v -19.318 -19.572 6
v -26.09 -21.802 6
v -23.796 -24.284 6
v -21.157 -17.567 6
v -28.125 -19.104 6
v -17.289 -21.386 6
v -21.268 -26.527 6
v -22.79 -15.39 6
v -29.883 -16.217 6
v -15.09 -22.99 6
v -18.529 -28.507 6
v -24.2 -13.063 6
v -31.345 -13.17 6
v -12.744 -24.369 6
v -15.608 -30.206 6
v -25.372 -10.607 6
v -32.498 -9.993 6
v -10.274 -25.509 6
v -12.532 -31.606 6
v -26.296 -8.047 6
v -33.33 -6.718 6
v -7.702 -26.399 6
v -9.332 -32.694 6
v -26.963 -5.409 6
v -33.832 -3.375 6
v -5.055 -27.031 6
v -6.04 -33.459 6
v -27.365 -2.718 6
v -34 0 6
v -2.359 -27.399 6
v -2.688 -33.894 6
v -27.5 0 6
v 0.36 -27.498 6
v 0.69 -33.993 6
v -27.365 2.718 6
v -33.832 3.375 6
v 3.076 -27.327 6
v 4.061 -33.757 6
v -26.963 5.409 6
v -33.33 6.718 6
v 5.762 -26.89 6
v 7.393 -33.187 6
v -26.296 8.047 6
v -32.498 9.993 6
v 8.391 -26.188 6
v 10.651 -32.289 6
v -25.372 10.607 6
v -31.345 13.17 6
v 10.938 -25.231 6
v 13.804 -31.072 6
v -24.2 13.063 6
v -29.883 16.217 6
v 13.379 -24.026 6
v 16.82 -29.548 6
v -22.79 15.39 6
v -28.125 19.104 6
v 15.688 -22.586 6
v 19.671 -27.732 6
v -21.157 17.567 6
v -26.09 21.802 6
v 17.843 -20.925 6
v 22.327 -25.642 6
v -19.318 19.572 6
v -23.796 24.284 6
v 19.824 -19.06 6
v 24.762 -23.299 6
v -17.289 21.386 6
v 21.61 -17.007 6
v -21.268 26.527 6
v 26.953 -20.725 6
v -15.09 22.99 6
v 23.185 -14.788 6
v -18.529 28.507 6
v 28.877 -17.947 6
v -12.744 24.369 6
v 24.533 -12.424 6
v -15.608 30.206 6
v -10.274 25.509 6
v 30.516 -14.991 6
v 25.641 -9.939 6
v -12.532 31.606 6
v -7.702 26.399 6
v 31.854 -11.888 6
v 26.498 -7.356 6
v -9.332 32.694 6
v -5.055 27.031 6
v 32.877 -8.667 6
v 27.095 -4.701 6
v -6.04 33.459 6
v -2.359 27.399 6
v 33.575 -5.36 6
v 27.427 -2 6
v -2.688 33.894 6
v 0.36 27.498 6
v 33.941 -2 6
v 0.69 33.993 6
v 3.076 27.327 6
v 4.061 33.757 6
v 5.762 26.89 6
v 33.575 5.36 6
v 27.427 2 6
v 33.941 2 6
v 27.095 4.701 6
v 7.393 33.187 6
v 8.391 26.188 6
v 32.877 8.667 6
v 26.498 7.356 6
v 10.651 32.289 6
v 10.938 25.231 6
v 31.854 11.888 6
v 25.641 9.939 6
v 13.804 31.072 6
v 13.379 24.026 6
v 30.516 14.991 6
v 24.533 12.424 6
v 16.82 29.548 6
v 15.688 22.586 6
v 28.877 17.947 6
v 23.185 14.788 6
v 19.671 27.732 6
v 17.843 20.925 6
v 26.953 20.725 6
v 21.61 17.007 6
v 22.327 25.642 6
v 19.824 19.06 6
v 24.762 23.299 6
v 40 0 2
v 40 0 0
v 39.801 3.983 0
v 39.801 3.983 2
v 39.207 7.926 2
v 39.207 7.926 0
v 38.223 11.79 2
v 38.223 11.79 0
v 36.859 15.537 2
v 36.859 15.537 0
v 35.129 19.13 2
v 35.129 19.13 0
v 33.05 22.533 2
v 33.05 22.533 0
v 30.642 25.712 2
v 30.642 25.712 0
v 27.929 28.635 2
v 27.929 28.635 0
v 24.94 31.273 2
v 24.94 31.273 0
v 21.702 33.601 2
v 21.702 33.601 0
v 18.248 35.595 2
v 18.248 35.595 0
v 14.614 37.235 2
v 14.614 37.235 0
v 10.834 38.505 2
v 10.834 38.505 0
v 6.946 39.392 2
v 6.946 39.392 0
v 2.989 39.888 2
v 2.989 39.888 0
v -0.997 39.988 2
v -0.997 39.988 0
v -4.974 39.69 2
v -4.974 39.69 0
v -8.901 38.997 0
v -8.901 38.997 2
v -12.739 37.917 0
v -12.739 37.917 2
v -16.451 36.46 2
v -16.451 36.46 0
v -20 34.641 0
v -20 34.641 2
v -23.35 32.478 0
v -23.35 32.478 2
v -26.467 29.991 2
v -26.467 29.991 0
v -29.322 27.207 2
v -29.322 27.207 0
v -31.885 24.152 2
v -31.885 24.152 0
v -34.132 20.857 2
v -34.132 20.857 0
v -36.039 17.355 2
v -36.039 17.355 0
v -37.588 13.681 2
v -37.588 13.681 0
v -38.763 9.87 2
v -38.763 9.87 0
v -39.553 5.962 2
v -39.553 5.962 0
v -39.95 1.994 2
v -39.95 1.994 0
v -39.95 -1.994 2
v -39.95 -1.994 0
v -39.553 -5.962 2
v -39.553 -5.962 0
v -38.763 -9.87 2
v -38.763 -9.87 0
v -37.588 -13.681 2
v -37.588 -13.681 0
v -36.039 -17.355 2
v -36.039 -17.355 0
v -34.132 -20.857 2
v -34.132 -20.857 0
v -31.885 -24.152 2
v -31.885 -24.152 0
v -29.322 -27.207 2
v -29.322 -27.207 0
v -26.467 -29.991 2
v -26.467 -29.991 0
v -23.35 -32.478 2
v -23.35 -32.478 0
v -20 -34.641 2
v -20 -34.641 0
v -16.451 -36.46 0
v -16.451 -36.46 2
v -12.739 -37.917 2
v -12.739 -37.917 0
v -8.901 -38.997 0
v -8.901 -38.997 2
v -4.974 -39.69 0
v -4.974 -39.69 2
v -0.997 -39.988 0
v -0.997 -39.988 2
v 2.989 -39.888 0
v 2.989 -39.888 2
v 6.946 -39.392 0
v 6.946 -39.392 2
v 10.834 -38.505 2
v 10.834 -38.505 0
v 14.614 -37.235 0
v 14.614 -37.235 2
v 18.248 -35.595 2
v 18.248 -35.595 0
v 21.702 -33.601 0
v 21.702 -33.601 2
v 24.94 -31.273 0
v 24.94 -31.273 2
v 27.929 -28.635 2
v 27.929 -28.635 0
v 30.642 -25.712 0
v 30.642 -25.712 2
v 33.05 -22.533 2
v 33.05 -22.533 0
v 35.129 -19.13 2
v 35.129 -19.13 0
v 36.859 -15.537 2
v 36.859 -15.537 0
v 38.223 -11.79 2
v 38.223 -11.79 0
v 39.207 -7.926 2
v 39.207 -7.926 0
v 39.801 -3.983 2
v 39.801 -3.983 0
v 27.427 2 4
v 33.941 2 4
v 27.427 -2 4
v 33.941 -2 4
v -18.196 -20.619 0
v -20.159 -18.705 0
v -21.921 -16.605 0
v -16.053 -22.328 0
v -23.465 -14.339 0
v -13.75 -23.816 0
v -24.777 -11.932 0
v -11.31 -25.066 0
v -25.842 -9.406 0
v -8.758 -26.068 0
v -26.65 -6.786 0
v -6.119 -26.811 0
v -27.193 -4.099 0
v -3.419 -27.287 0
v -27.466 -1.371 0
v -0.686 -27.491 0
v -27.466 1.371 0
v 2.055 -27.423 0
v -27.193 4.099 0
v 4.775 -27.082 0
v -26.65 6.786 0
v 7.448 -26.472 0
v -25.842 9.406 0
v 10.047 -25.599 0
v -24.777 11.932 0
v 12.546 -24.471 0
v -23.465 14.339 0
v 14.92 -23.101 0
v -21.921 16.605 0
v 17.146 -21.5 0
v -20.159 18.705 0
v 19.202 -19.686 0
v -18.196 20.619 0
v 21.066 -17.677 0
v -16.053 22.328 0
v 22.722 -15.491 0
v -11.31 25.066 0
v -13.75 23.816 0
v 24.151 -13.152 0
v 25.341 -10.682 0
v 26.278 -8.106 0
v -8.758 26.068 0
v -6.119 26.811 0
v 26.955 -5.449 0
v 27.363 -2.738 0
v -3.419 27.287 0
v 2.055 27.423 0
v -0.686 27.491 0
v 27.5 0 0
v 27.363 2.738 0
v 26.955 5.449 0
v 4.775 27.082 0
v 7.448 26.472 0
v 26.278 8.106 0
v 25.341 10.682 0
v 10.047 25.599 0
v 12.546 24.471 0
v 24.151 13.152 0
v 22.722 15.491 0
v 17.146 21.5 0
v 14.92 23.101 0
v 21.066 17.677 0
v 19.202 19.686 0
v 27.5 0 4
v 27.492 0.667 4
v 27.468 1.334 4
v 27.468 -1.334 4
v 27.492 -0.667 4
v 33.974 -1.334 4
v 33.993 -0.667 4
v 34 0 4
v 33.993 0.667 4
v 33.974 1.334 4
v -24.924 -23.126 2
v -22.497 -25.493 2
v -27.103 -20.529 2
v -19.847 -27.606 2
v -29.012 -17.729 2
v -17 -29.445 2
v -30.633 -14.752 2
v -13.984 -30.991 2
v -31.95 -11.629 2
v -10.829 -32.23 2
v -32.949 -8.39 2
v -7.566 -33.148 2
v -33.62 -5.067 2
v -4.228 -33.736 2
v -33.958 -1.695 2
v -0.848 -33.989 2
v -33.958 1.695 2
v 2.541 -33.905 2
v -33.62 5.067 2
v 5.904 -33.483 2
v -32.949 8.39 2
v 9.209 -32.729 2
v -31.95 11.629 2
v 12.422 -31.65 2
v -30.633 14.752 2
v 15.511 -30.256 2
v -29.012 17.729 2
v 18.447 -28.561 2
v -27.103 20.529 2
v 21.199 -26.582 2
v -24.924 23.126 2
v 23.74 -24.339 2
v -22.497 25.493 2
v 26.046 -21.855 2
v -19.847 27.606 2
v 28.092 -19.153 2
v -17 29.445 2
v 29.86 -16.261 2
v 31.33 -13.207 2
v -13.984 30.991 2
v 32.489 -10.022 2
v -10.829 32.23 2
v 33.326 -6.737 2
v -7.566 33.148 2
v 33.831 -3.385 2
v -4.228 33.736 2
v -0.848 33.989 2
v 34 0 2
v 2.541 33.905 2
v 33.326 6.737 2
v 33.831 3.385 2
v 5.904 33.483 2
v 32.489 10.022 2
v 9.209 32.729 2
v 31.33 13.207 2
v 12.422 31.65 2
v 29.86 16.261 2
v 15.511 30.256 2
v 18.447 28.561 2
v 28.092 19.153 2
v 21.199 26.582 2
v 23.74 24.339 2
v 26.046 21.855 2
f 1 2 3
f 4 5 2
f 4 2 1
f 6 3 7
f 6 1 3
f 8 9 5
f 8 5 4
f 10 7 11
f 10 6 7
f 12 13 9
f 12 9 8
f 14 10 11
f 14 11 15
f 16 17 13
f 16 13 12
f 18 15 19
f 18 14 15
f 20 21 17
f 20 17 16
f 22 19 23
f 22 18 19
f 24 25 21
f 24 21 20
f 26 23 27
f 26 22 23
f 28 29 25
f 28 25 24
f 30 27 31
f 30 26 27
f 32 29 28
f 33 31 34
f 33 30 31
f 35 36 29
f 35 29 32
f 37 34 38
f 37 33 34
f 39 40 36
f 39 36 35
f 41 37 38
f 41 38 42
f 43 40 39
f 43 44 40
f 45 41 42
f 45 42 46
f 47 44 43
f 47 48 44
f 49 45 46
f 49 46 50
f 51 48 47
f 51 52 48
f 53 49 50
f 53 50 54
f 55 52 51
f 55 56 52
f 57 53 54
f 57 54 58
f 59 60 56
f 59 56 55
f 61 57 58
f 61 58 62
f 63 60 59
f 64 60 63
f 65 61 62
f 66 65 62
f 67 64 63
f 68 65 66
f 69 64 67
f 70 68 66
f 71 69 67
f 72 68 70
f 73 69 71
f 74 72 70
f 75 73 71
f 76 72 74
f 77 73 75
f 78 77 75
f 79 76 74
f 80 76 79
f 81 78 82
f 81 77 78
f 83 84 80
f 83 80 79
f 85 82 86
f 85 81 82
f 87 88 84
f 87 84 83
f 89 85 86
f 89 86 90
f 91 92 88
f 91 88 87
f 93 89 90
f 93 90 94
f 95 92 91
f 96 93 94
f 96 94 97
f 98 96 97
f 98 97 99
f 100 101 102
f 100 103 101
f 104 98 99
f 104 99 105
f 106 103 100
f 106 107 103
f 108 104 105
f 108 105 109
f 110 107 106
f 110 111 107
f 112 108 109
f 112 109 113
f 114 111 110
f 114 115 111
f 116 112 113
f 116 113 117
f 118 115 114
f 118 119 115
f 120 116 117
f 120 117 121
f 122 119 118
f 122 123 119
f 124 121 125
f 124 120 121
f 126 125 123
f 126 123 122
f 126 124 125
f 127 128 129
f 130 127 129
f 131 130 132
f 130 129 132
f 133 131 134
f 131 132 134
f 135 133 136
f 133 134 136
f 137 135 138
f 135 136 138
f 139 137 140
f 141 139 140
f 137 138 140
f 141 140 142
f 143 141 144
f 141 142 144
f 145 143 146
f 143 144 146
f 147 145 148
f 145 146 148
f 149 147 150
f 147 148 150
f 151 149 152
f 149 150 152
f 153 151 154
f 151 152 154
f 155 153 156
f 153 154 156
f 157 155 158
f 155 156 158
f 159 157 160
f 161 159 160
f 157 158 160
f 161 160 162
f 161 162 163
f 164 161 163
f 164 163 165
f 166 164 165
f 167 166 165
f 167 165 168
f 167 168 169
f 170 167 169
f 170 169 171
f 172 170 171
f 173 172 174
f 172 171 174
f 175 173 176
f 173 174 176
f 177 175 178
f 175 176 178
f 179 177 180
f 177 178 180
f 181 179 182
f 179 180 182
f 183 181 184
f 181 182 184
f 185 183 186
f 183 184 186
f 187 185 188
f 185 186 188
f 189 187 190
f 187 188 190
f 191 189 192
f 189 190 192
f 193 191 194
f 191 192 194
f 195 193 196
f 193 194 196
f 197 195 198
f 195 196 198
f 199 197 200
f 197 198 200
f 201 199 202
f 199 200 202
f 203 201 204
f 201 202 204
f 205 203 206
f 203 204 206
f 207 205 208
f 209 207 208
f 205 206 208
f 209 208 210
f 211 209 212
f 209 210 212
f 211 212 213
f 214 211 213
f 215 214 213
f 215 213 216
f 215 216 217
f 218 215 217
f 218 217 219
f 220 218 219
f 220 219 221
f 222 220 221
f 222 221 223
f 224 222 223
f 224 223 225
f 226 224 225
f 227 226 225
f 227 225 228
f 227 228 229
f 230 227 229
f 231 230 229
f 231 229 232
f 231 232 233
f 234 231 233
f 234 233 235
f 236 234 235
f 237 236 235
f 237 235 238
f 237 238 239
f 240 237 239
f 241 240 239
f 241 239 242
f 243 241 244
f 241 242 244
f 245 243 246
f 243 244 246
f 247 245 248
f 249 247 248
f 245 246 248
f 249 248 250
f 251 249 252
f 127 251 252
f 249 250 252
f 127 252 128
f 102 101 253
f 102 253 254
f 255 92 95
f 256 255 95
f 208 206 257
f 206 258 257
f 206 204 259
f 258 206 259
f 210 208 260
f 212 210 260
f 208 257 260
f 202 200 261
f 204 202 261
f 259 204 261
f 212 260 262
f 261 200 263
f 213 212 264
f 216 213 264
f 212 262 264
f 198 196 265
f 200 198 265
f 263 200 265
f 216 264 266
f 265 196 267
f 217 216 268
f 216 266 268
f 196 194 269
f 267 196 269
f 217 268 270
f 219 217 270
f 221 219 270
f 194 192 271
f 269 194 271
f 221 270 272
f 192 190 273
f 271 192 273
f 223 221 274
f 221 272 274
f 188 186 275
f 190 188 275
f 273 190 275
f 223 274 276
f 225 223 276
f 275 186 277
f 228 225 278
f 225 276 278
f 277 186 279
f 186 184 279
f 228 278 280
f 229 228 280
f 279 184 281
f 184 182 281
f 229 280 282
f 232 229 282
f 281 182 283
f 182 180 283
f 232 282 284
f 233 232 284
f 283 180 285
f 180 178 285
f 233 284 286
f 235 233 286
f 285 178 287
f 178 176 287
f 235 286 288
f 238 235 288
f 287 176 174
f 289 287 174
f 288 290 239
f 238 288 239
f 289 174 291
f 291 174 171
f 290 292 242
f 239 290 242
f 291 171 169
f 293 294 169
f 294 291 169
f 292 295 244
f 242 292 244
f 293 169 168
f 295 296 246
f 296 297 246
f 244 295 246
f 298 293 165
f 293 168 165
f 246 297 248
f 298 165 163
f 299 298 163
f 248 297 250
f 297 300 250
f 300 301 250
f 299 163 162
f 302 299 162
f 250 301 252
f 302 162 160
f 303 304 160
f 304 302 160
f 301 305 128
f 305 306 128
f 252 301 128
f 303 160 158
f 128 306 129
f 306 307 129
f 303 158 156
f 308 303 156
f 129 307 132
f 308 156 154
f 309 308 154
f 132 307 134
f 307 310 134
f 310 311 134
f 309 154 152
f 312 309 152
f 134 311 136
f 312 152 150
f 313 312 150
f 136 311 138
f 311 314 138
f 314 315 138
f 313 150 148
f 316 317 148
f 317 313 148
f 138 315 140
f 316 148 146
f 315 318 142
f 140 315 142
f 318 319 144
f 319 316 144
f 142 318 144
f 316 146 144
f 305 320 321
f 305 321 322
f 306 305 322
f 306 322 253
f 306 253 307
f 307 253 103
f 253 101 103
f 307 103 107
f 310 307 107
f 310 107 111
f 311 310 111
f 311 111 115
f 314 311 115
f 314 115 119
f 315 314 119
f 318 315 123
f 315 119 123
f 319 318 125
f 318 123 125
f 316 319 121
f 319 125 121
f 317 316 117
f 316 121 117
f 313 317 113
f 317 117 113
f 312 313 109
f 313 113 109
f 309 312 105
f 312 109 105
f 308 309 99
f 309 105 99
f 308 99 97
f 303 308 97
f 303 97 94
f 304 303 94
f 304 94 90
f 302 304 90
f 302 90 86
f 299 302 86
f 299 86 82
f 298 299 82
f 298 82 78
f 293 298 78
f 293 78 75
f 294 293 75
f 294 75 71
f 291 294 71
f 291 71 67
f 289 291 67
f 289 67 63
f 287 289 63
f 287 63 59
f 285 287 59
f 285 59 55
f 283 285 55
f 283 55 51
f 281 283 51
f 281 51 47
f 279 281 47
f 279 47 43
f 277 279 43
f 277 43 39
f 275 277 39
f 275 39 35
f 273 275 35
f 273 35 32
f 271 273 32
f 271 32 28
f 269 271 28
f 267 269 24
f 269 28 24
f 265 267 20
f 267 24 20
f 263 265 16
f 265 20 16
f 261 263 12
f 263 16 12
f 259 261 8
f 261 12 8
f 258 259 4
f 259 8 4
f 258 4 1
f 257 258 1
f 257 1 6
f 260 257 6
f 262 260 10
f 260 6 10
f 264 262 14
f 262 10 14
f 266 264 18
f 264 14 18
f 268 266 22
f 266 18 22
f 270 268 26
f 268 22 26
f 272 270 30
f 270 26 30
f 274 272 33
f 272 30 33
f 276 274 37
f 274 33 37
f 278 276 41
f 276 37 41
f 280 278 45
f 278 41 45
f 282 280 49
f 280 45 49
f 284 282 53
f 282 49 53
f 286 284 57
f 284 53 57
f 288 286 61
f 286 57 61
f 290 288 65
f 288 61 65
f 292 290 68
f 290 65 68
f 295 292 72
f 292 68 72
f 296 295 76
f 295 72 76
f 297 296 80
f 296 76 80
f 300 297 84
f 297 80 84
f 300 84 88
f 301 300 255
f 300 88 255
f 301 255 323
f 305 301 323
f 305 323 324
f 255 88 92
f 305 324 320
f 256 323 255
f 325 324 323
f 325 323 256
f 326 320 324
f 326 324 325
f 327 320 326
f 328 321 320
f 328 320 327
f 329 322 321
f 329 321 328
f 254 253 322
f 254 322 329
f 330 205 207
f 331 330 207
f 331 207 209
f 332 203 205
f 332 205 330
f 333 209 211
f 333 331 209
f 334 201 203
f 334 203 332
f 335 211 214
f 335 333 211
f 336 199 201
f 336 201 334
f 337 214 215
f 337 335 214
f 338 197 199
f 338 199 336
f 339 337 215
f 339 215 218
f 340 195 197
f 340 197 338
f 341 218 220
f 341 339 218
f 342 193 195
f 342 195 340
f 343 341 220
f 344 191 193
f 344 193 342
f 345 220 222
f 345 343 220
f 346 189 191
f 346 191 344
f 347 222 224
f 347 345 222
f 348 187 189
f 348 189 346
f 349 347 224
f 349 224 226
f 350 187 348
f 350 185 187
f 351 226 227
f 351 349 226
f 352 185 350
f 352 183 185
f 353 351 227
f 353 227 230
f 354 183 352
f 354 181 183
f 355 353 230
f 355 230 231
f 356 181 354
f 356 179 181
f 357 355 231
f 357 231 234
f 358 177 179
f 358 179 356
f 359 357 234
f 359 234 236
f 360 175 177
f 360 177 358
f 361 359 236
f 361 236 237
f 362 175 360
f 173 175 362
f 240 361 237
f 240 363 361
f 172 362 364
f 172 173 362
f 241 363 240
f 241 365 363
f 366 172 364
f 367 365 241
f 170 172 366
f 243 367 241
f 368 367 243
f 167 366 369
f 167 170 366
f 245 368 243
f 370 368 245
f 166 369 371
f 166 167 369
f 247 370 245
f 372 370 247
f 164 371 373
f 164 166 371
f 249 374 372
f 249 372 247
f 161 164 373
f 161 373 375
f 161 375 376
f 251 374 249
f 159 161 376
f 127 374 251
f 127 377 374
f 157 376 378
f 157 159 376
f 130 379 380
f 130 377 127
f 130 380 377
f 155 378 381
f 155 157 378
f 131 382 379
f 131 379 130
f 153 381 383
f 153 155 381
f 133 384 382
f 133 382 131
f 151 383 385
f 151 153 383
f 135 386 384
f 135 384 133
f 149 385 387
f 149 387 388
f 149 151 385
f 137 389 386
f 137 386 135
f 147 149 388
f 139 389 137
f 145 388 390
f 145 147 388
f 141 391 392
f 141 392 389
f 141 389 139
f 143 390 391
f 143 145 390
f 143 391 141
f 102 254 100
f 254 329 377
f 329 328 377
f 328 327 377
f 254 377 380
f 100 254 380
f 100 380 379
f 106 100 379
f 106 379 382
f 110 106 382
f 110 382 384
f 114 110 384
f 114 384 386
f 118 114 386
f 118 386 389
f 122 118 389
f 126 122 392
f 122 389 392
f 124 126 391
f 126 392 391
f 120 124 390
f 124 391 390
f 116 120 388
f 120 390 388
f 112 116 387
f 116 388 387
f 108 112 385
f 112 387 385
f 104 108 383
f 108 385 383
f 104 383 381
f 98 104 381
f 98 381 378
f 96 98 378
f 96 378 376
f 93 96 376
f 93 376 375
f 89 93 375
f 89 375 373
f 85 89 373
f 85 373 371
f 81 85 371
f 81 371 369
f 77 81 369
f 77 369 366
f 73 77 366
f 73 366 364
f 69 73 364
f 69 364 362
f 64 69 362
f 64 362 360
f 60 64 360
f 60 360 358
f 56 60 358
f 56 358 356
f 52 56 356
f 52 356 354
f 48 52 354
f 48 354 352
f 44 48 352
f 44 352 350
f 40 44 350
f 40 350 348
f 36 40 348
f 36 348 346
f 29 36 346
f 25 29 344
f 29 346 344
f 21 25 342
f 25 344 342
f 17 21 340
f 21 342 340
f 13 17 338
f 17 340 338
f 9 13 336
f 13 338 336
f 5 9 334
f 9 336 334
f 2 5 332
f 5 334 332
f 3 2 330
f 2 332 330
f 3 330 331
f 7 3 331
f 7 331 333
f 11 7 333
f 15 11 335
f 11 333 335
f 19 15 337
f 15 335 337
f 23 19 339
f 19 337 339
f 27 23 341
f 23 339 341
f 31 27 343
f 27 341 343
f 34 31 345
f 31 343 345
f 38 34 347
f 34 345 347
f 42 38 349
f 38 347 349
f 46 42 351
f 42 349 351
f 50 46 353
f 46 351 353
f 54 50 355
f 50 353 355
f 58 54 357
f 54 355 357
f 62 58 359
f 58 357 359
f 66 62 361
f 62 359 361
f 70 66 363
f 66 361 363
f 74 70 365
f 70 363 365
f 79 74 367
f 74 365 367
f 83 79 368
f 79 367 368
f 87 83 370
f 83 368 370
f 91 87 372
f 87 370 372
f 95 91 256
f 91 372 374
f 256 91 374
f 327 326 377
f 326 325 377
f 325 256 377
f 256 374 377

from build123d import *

# Parameters (mm, degrees)
SKETCH_1_R          = 40
EXTRUDE_1_DEPTH     = 2
SKETCH_2_R          = 34
EXTRUDE_2_DEPTH     = 6
SKETCH_3_R          = 27.5
CUT_EXTRUDE_1_DEPTH = 57.885850613
SKETCH_4_W          = 46.937334883
SKETCH_4_H          = 4
CUT_EXTRUDE_2_DEPTH = 2


with BuildPart() as part:
    # 草图1 → 凸台-拉伸1 (new body)
    with BuildSketch(Plane.XY):
        Circle(SKETCH_1_R)
    extrude(amount=EXTRUDE_1_DEPTH)

    # 草图2 → 凸台-拉伸2 (add)
    with BuildSketch(Plane.XY):
        Circle(SKETCH_2_R)
    extrude(amount=EXTRUDE_2_DEPTH)

    # 草图3 → 切除-拉伸1 (cut, through all)
    with BuildSketch(Plane.XY.offset(6)):
        Circle(SKETCH_3_R)
    extrude(amount=-CUT_EXTRUDE_1_DEPTH, mode=Mode.SUBTRACT)

    # 草图4 → 切除-拉伸2 (cut)
    with BuildSketch(Plane.XY.offset(6)):
        with Locations((30.403538279, 0)):
            Rectangle(SKETCH_4_W, SKETCH_4_H)
    extrude(amount=-CUT_EXTRUDE_2_DEPTH, mode=Mode.SUBTRACT)


solid = part.part
